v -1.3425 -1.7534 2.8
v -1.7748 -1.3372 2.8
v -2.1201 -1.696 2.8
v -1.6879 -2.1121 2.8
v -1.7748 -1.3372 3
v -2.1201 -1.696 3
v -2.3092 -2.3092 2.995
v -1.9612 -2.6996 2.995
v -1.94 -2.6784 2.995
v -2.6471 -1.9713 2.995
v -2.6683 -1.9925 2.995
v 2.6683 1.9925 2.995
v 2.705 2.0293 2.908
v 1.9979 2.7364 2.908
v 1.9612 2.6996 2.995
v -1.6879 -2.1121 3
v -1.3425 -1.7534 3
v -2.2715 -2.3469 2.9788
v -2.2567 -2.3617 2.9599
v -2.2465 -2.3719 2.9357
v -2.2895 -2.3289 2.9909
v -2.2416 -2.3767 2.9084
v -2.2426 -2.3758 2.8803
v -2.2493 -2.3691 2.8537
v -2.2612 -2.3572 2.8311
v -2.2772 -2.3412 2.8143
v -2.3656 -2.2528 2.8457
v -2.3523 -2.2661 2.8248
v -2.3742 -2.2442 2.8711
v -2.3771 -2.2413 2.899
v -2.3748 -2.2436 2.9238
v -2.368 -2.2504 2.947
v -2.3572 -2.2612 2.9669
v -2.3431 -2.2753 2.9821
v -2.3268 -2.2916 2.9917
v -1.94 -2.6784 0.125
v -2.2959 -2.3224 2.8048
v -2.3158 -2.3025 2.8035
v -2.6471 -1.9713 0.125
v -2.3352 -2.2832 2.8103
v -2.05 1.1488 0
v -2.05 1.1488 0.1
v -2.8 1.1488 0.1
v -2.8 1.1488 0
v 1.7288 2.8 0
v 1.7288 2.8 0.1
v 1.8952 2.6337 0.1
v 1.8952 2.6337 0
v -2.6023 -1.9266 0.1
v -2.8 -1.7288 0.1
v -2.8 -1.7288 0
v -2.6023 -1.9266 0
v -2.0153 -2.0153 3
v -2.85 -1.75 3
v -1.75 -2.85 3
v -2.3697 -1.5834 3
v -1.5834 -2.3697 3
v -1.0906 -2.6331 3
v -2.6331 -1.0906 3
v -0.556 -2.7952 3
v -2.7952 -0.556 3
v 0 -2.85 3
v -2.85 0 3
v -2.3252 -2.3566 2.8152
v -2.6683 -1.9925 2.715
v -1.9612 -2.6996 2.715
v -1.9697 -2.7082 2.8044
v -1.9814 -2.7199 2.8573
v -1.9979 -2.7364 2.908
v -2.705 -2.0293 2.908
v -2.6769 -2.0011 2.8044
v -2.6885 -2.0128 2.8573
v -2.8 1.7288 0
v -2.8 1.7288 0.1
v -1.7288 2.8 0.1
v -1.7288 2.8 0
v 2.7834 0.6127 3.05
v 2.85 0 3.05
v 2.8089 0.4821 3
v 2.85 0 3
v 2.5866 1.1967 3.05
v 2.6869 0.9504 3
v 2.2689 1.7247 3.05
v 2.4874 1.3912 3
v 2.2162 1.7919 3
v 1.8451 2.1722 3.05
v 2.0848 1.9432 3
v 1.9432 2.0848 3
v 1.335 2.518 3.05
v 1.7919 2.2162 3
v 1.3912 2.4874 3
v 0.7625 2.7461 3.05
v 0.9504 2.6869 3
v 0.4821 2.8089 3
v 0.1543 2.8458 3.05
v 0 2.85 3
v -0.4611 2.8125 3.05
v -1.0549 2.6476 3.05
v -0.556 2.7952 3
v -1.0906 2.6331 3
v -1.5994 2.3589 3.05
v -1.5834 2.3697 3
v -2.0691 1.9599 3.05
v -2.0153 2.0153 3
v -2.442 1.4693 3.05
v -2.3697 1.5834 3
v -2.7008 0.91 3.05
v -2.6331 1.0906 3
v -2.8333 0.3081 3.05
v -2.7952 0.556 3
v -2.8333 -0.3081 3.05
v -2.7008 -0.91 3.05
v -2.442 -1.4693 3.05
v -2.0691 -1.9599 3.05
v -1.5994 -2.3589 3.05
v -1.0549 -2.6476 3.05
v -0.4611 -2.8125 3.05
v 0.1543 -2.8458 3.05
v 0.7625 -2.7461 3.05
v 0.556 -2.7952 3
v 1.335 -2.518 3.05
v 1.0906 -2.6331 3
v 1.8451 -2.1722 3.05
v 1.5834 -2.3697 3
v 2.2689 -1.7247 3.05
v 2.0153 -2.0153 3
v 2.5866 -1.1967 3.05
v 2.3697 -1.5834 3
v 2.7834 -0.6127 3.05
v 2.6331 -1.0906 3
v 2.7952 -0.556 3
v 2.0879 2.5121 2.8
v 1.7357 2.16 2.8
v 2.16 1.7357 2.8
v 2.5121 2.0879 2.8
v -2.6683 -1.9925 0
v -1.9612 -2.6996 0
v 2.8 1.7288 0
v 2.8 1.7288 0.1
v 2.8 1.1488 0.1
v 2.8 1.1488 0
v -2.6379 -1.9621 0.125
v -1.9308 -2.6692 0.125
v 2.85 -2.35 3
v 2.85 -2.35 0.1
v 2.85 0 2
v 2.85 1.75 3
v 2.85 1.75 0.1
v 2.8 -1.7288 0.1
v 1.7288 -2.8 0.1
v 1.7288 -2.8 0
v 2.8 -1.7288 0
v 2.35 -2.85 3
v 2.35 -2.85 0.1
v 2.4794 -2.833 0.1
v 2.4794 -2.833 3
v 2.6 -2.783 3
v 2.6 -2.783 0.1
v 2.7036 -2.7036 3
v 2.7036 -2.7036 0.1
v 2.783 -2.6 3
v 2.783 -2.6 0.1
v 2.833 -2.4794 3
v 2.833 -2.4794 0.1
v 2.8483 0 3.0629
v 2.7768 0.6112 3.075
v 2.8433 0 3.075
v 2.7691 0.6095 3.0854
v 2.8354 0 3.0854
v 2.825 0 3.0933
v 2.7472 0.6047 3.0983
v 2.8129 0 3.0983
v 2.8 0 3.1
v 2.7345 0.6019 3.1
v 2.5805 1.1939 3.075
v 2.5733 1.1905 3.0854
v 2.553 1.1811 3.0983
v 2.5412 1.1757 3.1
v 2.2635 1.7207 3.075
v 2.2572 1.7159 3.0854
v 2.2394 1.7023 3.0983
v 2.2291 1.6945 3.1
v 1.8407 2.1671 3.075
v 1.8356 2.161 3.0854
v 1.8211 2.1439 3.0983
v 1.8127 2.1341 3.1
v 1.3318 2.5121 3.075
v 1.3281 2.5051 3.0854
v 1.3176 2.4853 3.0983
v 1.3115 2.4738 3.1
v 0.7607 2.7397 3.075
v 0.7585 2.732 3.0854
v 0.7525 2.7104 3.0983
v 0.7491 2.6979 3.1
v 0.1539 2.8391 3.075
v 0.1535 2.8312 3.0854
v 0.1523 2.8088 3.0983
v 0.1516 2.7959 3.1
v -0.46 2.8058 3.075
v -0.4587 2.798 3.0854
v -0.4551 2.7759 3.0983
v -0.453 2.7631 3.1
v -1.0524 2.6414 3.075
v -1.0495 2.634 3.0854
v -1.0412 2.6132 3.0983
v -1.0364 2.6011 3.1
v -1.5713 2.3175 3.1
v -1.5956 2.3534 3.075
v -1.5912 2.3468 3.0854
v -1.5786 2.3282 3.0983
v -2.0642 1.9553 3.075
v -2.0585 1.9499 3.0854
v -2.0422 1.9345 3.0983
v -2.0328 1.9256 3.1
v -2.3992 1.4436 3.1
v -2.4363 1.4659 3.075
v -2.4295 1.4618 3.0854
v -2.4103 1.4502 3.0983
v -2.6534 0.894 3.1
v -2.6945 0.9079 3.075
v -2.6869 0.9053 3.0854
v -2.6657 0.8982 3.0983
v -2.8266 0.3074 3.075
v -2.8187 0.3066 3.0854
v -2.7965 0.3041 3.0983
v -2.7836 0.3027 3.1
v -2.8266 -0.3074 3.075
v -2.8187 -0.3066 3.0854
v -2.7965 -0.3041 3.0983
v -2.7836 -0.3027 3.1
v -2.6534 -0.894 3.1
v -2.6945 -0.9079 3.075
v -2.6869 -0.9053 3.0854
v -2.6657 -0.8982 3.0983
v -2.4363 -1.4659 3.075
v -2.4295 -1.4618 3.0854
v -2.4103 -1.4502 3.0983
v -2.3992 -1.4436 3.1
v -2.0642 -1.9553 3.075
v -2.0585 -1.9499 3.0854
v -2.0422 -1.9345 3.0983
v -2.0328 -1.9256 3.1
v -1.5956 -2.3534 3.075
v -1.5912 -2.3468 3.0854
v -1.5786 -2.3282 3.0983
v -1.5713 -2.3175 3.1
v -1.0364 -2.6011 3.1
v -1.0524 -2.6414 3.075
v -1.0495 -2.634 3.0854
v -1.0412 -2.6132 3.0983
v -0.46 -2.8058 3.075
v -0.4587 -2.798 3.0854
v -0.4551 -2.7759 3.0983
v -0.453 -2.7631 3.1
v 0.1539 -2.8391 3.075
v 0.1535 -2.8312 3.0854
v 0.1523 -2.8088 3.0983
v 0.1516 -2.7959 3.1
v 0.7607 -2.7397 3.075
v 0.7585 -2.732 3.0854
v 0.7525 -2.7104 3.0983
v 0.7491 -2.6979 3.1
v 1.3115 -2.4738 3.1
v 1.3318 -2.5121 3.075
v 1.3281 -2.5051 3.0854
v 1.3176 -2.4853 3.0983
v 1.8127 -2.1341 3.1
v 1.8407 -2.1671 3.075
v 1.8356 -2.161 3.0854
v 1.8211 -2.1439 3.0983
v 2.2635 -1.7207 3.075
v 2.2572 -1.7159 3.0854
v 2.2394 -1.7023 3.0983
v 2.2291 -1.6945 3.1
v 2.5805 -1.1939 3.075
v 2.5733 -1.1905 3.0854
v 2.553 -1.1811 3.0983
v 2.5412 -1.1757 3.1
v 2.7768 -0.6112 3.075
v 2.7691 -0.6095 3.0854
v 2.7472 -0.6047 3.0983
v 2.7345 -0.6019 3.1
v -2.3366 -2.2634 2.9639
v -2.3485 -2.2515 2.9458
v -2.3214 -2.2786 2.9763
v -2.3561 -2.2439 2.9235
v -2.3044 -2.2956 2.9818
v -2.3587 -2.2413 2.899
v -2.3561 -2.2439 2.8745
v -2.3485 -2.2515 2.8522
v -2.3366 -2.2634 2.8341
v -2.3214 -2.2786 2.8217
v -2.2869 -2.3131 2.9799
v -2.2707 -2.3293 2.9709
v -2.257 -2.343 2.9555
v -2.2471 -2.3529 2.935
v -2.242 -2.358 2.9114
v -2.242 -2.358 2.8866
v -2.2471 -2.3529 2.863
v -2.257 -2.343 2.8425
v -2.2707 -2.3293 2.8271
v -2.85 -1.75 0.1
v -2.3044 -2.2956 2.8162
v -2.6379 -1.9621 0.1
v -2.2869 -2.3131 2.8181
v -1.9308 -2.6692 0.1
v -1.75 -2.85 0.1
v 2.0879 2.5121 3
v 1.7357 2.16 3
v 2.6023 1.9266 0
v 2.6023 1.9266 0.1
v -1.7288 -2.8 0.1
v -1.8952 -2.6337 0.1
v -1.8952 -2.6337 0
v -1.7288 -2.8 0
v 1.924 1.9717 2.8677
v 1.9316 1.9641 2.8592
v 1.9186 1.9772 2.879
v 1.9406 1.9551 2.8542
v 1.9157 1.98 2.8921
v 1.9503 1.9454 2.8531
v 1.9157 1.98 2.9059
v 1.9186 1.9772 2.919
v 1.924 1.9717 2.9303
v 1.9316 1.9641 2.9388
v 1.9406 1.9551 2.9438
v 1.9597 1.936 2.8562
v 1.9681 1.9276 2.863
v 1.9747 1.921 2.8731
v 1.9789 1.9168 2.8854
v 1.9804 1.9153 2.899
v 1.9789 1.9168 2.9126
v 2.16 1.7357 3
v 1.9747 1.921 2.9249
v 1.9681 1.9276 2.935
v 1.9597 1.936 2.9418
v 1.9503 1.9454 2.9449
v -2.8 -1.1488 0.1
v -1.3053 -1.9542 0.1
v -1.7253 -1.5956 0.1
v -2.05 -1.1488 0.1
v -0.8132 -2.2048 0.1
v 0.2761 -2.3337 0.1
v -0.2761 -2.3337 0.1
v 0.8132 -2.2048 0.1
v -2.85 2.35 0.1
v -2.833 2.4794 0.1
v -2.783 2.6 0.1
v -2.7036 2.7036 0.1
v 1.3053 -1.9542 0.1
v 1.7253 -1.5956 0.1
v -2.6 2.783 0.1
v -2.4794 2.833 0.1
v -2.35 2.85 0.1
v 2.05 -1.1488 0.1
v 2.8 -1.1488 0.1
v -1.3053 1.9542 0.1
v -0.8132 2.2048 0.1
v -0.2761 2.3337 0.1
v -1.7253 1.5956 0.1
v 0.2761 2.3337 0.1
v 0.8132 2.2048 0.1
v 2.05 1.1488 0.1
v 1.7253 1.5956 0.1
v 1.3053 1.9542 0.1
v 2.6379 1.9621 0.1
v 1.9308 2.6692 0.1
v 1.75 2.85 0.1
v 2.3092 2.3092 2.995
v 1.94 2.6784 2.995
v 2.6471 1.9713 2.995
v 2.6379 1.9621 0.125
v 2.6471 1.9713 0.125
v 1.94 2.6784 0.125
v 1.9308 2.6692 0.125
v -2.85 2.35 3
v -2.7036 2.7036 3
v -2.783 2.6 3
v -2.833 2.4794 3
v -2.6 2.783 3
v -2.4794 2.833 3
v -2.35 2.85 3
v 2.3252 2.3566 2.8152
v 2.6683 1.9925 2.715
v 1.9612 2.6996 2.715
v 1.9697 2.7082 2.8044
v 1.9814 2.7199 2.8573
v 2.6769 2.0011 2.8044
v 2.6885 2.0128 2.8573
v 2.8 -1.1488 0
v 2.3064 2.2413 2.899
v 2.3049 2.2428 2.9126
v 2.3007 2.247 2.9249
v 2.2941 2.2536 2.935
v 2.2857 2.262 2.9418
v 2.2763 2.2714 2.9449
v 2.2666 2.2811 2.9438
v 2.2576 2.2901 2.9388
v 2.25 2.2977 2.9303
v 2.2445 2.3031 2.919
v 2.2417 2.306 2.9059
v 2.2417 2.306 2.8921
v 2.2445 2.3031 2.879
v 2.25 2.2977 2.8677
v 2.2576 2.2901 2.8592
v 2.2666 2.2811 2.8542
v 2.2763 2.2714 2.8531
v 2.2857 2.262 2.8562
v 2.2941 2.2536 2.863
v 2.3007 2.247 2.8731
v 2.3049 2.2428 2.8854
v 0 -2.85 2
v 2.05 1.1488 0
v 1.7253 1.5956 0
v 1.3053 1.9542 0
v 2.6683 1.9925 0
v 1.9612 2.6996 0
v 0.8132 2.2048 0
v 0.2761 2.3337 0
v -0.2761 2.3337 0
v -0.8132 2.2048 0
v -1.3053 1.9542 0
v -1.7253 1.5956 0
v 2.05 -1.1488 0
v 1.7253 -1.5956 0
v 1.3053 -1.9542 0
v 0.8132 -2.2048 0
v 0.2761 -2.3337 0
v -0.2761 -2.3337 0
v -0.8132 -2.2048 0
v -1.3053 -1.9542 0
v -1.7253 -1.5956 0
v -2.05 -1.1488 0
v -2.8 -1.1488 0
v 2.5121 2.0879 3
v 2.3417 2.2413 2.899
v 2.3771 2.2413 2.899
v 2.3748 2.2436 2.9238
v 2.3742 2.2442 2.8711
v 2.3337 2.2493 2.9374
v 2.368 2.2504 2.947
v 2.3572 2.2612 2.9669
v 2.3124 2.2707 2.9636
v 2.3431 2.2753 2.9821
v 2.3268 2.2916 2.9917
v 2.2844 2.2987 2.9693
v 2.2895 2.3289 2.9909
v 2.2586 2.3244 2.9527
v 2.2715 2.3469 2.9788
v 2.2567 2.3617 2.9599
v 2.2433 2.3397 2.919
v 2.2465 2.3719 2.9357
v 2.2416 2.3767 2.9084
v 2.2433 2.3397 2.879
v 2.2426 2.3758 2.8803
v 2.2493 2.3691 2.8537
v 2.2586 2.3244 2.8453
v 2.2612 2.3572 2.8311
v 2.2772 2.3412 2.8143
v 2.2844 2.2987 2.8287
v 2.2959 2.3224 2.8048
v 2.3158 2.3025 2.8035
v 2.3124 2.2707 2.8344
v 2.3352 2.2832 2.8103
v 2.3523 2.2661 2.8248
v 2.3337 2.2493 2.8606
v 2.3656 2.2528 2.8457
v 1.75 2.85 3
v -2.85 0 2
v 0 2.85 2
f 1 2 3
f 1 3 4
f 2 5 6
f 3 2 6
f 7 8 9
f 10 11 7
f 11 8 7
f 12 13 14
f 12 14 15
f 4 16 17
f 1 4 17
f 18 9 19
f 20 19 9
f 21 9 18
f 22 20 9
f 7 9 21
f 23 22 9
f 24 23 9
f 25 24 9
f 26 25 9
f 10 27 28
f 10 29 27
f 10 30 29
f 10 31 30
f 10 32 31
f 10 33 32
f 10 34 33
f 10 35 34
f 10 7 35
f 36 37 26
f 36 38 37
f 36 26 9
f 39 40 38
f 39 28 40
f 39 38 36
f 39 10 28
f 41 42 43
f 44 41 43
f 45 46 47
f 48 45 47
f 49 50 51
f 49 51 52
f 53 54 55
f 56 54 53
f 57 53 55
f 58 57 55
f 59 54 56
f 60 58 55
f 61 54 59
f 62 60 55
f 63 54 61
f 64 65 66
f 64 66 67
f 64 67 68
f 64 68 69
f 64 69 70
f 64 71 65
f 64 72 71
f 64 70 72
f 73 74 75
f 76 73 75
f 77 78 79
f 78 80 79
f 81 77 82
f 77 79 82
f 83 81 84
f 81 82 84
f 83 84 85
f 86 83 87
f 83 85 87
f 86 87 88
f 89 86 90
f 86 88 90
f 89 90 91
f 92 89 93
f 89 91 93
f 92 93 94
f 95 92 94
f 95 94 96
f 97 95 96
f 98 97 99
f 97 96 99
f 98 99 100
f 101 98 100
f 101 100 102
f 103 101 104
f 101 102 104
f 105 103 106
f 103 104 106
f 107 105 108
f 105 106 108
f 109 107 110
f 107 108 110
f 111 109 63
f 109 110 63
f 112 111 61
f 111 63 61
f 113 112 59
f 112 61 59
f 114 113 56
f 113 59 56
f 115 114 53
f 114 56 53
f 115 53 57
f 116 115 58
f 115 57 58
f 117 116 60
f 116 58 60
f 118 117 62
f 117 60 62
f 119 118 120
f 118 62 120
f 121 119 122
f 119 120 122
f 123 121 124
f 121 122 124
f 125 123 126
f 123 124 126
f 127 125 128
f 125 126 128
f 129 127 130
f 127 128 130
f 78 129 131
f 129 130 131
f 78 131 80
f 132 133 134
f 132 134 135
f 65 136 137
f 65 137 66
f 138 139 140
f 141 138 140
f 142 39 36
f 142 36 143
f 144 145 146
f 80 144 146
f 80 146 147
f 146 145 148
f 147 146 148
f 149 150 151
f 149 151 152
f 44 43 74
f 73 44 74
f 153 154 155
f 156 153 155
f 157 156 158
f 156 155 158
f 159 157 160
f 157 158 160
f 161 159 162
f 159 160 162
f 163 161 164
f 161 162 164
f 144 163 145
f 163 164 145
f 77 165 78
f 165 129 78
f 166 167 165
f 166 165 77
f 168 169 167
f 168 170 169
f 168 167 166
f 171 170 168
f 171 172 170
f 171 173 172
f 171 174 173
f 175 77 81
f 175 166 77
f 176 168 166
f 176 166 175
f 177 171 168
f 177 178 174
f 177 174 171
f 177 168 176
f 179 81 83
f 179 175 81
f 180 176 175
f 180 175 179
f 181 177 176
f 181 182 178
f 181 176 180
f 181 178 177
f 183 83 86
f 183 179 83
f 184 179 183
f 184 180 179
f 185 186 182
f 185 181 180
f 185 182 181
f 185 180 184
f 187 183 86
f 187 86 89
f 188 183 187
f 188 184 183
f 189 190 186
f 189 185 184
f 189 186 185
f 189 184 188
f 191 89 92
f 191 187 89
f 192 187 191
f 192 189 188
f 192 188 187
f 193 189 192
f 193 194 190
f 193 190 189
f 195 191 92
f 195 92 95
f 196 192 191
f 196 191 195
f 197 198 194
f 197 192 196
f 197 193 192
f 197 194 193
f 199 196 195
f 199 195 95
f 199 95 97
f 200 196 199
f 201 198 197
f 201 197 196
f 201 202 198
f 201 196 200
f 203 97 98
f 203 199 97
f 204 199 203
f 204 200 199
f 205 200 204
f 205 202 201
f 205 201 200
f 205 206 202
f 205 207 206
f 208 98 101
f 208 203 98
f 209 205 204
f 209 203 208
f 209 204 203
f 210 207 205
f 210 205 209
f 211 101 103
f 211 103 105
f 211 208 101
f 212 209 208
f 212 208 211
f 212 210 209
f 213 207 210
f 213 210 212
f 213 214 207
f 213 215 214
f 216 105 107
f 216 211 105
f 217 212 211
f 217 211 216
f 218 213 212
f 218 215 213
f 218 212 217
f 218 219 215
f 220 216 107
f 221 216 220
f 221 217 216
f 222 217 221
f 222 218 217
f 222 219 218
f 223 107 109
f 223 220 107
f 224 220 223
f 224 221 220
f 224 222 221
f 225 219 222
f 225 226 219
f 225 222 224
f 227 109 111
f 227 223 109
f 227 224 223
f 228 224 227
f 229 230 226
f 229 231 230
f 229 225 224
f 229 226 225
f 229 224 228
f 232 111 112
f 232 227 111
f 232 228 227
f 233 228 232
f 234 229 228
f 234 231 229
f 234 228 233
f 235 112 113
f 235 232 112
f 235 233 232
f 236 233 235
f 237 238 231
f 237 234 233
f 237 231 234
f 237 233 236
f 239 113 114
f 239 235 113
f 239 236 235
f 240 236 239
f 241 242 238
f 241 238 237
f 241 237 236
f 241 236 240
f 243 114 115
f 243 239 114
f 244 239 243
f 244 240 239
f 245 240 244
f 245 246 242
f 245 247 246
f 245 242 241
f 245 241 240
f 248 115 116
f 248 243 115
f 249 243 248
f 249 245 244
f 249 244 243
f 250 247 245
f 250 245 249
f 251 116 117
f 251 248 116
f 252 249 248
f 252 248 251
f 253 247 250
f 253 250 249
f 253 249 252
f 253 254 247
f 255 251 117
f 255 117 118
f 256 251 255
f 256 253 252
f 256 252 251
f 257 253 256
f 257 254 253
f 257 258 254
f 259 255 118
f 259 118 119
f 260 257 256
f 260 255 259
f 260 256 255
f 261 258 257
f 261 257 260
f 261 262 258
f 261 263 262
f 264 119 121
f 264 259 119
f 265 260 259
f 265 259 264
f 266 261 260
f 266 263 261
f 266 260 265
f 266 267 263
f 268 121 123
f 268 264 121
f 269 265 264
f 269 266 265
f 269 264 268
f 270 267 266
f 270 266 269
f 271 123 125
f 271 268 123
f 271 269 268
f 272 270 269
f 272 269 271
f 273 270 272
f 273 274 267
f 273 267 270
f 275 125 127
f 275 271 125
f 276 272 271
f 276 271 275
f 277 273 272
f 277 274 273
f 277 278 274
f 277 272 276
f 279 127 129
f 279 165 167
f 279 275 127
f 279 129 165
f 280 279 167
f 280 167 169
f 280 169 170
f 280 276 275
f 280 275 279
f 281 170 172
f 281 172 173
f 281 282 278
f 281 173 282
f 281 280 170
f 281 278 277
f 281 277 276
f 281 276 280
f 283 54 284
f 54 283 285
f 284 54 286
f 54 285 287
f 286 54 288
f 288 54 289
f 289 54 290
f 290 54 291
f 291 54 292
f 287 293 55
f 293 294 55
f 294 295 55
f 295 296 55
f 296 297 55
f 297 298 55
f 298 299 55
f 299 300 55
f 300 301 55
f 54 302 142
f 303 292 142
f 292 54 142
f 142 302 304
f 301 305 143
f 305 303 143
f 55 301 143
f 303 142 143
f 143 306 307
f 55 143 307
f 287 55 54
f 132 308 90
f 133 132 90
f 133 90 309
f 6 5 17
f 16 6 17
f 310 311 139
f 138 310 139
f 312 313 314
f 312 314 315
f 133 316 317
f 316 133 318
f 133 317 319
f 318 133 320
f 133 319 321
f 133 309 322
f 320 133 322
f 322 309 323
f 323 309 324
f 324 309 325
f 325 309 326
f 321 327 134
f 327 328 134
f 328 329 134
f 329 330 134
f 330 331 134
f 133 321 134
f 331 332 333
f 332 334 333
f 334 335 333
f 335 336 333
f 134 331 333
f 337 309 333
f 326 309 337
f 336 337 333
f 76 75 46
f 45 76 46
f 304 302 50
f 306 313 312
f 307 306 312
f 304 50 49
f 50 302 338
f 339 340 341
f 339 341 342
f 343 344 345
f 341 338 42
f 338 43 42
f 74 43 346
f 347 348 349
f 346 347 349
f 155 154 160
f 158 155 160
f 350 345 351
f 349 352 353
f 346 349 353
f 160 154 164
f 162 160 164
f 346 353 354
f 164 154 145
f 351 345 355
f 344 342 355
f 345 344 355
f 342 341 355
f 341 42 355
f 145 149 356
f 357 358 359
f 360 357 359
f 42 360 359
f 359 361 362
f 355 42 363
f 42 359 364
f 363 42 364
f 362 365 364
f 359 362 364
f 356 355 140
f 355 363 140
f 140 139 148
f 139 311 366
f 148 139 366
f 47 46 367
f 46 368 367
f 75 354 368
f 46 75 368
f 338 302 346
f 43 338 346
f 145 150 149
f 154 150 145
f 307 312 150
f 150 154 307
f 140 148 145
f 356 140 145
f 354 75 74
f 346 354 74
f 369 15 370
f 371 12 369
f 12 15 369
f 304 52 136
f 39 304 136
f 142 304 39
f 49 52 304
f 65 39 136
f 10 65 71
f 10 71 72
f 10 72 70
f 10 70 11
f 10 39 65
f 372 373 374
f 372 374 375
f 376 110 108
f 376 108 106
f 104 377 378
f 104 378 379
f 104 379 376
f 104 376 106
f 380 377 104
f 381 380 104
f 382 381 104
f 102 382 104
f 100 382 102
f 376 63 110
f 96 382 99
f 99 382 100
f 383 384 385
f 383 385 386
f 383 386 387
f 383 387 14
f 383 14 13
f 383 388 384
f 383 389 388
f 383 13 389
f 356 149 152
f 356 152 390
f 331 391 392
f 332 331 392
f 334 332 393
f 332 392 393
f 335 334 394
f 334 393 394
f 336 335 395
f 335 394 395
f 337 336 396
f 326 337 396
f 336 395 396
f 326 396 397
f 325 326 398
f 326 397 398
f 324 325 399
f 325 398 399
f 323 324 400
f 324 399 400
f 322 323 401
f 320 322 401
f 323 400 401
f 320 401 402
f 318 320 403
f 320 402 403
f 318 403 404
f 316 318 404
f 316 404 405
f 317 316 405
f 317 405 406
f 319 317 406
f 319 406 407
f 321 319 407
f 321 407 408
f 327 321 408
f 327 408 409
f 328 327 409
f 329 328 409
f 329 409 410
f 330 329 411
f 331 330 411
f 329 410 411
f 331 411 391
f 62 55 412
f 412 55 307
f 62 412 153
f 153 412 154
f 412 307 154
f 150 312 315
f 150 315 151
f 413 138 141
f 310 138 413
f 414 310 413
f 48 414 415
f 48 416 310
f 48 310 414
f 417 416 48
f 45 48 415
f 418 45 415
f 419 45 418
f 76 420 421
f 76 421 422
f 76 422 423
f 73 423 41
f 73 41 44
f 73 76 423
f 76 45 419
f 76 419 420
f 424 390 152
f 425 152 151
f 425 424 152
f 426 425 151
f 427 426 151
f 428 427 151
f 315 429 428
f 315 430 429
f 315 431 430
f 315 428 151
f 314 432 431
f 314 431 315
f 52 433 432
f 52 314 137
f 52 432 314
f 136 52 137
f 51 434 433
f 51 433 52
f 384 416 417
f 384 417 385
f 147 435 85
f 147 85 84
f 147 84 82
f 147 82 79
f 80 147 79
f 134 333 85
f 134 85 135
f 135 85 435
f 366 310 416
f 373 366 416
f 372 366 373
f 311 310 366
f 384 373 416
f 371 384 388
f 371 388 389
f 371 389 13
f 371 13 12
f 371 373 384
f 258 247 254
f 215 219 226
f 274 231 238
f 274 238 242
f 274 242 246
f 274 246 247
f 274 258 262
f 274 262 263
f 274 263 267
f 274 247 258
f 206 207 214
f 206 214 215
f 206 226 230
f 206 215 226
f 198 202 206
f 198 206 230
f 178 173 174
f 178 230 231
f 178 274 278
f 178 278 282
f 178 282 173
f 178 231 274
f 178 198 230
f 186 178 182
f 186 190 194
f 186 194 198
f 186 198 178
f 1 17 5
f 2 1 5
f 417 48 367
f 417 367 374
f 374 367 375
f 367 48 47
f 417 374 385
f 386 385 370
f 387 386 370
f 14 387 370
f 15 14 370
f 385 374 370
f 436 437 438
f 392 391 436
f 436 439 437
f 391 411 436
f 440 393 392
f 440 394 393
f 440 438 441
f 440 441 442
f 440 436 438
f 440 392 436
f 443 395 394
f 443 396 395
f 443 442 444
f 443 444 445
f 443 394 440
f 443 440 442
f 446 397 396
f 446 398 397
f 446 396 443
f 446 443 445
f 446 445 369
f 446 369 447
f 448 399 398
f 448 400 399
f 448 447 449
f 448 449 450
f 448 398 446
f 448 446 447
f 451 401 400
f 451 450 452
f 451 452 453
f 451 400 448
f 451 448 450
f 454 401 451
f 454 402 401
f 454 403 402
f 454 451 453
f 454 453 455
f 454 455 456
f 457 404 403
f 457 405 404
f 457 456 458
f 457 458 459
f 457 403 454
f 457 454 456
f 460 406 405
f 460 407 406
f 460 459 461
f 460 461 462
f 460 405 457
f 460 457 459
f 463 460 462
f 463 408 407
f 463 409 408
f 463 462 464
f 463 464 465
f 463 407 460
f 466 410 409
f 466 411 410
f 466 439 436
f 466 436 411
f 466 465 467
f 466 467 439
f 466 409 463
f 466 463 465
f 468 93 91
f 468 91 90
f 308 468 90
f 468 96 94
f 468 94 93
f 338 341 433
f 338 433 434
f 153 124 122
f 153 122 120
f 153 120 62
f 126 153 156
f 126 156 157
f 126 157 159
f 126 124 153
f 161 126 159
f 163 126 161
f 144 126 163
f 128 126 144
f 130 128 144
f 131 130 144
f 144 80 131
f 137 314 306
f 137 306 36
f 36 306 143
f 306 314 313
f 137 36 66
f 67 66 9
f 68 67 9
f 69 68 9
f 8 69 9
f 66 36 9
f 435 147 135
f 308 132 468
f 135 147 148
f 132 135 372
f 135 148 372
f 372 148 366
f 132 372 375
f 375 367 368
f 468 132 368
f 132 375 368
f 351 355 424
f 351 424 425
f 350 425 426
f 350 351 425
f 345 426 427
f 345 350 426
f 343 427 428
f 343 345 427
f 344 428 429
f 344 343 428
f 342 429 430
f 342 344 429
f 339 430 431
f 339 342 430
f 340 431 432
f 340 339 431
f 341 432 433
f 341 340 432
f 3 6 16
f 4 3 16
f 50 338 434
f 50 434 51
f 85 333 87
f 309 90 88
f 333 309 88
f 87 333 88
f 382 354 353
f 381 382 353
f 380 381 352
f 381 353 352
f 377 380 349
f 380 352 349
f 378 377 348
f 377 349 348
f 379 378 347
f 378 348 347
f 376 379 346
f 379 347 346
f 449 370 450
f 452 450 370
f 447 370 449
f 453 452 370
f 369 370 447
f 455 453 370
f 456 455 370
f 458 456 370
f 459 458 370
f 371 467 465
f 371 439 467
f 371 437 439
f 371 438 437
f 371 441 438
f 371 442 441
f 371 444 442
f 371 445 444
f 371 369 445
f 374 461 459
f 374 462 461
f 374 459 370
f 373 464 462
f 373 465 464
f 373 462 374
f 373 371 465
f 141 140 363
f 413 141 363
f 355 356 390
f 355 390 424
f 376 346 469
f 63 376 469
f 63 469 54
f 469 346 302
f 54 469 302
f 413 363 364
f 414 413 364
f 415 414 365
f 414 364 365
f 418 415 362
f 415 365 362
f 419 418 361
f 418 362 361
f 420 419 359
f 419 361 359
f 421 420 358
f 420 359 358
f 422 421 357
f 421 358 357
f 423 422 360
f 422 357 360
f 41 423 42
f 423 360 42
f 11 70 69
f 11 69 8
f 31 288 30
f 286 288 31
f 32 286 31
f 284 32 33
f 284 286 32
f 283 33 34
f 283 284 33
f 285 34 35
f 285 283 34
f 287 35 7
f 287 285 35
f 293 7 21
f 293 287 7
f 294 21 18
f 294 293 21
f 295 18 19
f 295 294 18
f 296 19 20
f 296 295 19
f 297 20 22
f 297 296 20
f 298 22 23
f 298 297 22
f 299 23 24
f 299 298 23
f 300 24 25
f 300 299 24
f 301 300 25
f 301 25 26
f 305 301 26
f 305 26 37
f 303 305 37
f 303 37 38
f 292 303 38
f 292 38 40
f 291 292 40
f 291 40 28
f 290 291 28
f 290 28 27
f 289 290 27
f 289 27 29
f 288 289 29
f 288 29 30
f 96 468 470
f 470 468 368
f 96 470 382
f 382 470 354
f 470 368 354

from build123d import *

# Parameters (mm, degrees)
EXTRUDE_START                      = 0.1
EXTRUDE_726_DEPTH                  = 2.9
EXTRUDE_1021_DEPTH                 = 0.1
EXTRUDE_1021_DEPTH_BACK            = 1
SKETCH_2_R                         = 2.85
FILLET_1_R                         = 0.05
EXTRUDE_START_2                    = -0.3
EXTRUDE_1608_DEPTH                 = 1
CUT_EXTRUDE_8_DEPTH                = 0.2
EXTRUDE_START_3                    = 0.05
SKETCH_9_R                         = 0.046
EXTRUDE_1_DEPTH                    = 0.461
EXTRUDE_1_OTHER_WAY_DEPTH          = 0.05
EXTRUDE_1_OTHER_WAY_DRAFT          = 45
PATTERN_CIRCULAR_3_COUNT           = 2
PATTERN_START                      = 0.05
PATTERN_CIRCULAR_3_COPY_1_SKETCH_R = 0.046
PATTERN_CIRCULAR_3_COPY_1_DEPTH    = 0.05
PATTERN_CIRCULAR_3_COPY_1_DRAFT    = 45
PATTERN_CIRCULAR_3_COPY_2_SKETCH_R = 0.046
PATTERN_CIRCULAR_3_COPY_2_DEPTH    = 0.05
PATTERN_CIRCULAR_3_COPY_2_DRAFT    = 45
EXTRUDE_4261_DEPTH                 = 0.1


with BuildPart() as part:
    # Эскиз1 → Extrude 726 (new body)
    with BuildSketch(Plane.XY.offset(EXTRUDE_START)):
        with BuildLine():
            Line((-2.85, -1.75), (-1.75, -2.85))
            Line((-1.75, -2.85), (2.35, -2.85))
            ThreePointArc((2.35, -2.85), (2.703553391, -2.703553391), (2.85, -2.35))
            Line((2.85, -2.35), (2.85, 1.75))
            Line((2.85, 1.75), (1.75, 2.85))
            Line((1.75, 2.85), (-2.35, 2.85))
            ThreePointArc((-2.35, 2.85), (-2.703553391, 2.703553391), (-2.85, 2.35))
            Line((-2.85, 2.35), (-2.85, -1.75))
        make_face()
    extrude(amount=EXTRUDE_726_DEPTH)

    # Эскиз2 → Extrude 1021 (add, two sides: drawn at the far end of the back side and taken through both)
    with BuildSketch(Plane.XY.offset(3).offset(-EXTRUDE_1021_DEPTH_BACK)):
        Circle(SKETCH_2_R)
    extrude(amount=EXTRUDE_1021_DEPTH + EXTRUDE_1021_DEPTH_BACK)

    # Скругление1
    fillet_1_edges = [part.edges().sort_by_distance(p)[0] for p in [
        (-2.85, 0, 3.1),
    ]]
    fillet(fillet_1_edges, radius=FILLET_1_R)

    # Эскиз6 → Extrude 1608 (add)
    with BuildSketch(Plane(origin=(0.55, -0.55, 0), x_dir=(0, 0, 1), z_dir=(0.7071067811865498, -0.7071067811865452, 0)).offset(EXTRUDE_START_2)):
        with BuildLine():
            Line((2.908, -3.347691193), (2.995, -3.295691193))
            Line((2.995, -3.295691193), (2.995, -3.265691193))
            Line((2.995, -3.265691193), (0.125, -3.265691193))
            Line((0.125, -3.265691193), (0.125, -2.765691193))
            Line((0.125, -2.765691193), (0, -2.765691193))
            Line((0, -2.765691193), (0, -3.295691193))
            Line((0, -3.295691193), (2.715, -3.295691193))
            add(Edge.make_bspline(
                [(2.715, -3.295691193), (2.818817166, -3.299465526), (2.908, -3.347691193)],
                knots=[0, 0, 0, 1, 1, 1], degree=2))
        make_face()
    extrude_1608 = extrude(amount=-EXTRUDE_1608_DEPTH)

    # Эскиз8 → Вытянуть8 (cut)
    with BuildSketch(Plane.XY.offset(3)):
        Polygon((2.512132034, 2.087867966), (2.087867966, 2.512132034), (1.735728789, 2.159992857), (2.159992857, 1.735728789), align=None)
        Polygon((-1.687867966, -2.112132034), (-1.342499119, -1.753350263), (-1.774766314, -1.337243218), (-2.12013516, -1.69602499), align=None)
    extrude(amount=-CUT_EXTRUDE_8_DEPTH, mode=Mode.SUBTRACT)

    # Эскиз9 → Бобышка-Вытянуть1 (add)
    with BuildSketch(Plane(origin=(2.309192388, 2.309192388, 0), x_dir=(0, 0, 1), z_dir=(-0.7071067811865452, -0.7071067811865498, 0)).offset(EXTRUDE_START_3)):
        with Locations(Location((2.899, 0, 0), (0, 0, 270))):
            Circle(SKETCH_9_R)
    extrude_1 = extrude(amount=EXTRUDE_1_DEPTH)


with BuildPart() as extrude_1_other_way_tool:
    # Эскиз9 → Бобышка-Вытянуть1 other way (with draft: the straight prism first)
    with BuildSketch(Plane(origin=(2.309192388, 2.309192388, 0), x_dir=(0, 0, 1), z_dir=(-0.7071067811865452, -0.7071067811865498, 0)).offset(EXTRUDE_START_3)):
        with Locations(Location((2.899, 0, 0), (0, 0, 270))):
            Circle(SKETCH_9_R)
    extrude(amount=-EXTRUDE_1_OTHER_WAY_DEPTH)
    # Бобышка-Вытянуть1 other way: the draft: its side faces are tilted about the plane it starts from
    extrude_1_other_way_sides = [extrude_1_other_way_tool.faces().sort_by_distance(p)[0] for p in [
        (2.258987807, 2.324041631, 2.899),
    ]]
    draft(extrude_1_other_way_sides, Plane(origin=(2.309192388, 2.309192388, 0), x_dir=(0, 0, 1), z_dir=(-0.7071067811865452, -0.7071067811865498, 0)).offset(EXTRUDE_START_3), EXTRUDE_1_OTHER_WAY_DRAFT)


with BuildPart() as part_1:
    add(part.part)

    # Бобышка-Вытянуть1 other way: add extrude_1_other_way_tool
    add(extrude_1_other_way_tool.part)

    # Круговой массив3: Extrude 1608, Бобышка-Вытянуть1 ×2 about axis
    pattern_circular_3_axis = Axis((0, 0, 3.1), (0, 0, -1))
    add([extrude_1608.rotate(pattern_circular_3_axis, i * 360 / PATTERN_CIRCULAR_3_COUNT) for i in range(1, PATTERN_CIRCULAR_3_COUNT)])
    add([extrude_1.rotate(pattern_circular_3_axis, i * 360 / PATTERN_CIRCULAR_3_COUNT) for i in range(1, PATTERN_CIRCULAR_3_COUNT)])


with BuildPart() as pattern_circular_3_copy_1_tool:
    # Круговой массив3 copy 1 sketch → Круговой массив3 copy 1 (with draft: the straight prism first)
    with BuildSketch(Plane(origin=(-2.309192388, -2.309192388, 0), x_dir=(0, 0, 1), z_dir=(0.7071067811865451, 0.7071067811865499, 0)).offset(PATTERN_START)):
        with Locations(Location((2.899, 0, 0), (0, 0, 270))):
            Circle(PATTERN_CIRCULAR_3_COPY_1_SKETCH_R)
    extrude(amount=-PATTERN_CIRCULAR_3_COPY_1_DEPTH)
    # Круговой массив3 copy 1: the draft: its side faces are tilted about the plane it starts from
    pattern_circular_3_copy_1_sides = [pattern_circular_3_copy_1_tool.faces().sort_by_distance(p)[0] for p in [
        (-2.258987807, -2.324041631, 2.899),
    ]]
    draft(pattern_circular_3_copy_1_sides, Plane(origin=(-2.309192388, -2.309192388, 0), x_dir=(0, 0, 1), z_dir=(0.7071067811865451, 0.7071067811865499, 0)).offset(PATTERN_START), PATTERN_CIRCULAR_3_COPY_1_DRAFT)


with BuildPart() as part_2:
    add(part_1.part)

    # Круговой массив3 copy 1: add pattern_circular_3_copy_1_tool
    add(pattern_circular_3_copy_1_tool.part)


with BuildPart() as pattern_circular_3_copy_2_tool:
    # Круговой массив3 copy 2 sketch → Круговой массив3 copy 2 (with draft: the straight prism first)
    with BuildSketch(Plane(origin=(-2.309192388, -2.309192388, 0), x_dir=(0, 0, 1), z_dir=(0.7071067811865451, 0.7071067811865499, 0)).offset(PATTERN_START)):
        with Locations(Location((2.899, 0, 0), (0, 0, 270))):
            Circle(PATTERN_CIRCULAR_3_COPY_2_SKETCH_R)
    extrude(amount=-PATTERN_CIRCULAR_3_COPY_2_DEPTH)
    # Круговой массив3 copy 2: the draft: its side faces are tilted about the plane it starts from
    pattern_circular_3_copy_2_sides = [pattern_circular_3_copy_2_tool.faces().sort_by_distance(p)[0] for p in [
        (-2.258987807, -2.324041631, 2.899),
    ]]
    draft(pattern_circular_3_copy_2_sides, Plane(origin=(-2.309192388, -2.309192388, 0), x_dir=(0, 0, 1), z_dir=(0.7071067811865451, 0.7071067811865499, 0)).offset(PATTERN_START), PATTERN_CIRCULAR_3_COPY_2_DRAFT)


with BuildPart() as part_3:
    add(part_2.part)

    # Круговой массив3 copy 2: add pattern_circular_3_copy_2_tool
    add(pattern_circular_3_copy_2_tool.part)

    # Эскиз13 → Extrude 4261 (add)
    with BuildSketch(Plane(origin=(0, 0, 0.1), x_dir=(-1, 0, 0), z_dir=(0, 0, -1))):
        with BuildLine():
            Line((2.050035735, 1.148848765), (2.8, 1.148848765))
            Line((2.8, 1.148848765), (2.8, 1.728848765))
            Line((2.8, 1.728848765), (1.728848765, 2.8))
            Line((1.728848765, 2.8), (-1.728848765, 2.8))
            Line((-1.728848765, 2.8), (-2.8, 1.728848765))
            Line((-2.8, 1.728848765), (-2.8, 1.148848765))
            Line((-2.8, 1.148848765), (-2.050035735, 1.148848765))
            ThreePointArc((-2.050035735, 1.148848765), (0, 2.35), (2.050035735, 1.148848765))
        make_face()
        with BuildLine():
            Line((-2.8, -1.148848765), (-2.050035735, -1.148848765))
            ThreePointArc((-2.050035735, -1.148848765), (0, -2.35), (2.050035735, -1.148848765))
            Line((2.050035735, -1.148848765), (2.8, -1.148848765))
            Line((2.8, -1.148848765), (2.8, -1.728848765))
            Line((2.8, -1.728848765), (1.728848765, -2.8))
            Line((1.728848765, -2.8), (-1.728848765, -2.8))
            Line((-1.728848765, -2.8), (-2.8, -1.728848765))
            Line((-2.8, -1.728848765), (-2.8, -1.148848765))
        make_face()
    extrude(amount=EXTRUDE_4261_DEPTH)


solid = part_3.part
